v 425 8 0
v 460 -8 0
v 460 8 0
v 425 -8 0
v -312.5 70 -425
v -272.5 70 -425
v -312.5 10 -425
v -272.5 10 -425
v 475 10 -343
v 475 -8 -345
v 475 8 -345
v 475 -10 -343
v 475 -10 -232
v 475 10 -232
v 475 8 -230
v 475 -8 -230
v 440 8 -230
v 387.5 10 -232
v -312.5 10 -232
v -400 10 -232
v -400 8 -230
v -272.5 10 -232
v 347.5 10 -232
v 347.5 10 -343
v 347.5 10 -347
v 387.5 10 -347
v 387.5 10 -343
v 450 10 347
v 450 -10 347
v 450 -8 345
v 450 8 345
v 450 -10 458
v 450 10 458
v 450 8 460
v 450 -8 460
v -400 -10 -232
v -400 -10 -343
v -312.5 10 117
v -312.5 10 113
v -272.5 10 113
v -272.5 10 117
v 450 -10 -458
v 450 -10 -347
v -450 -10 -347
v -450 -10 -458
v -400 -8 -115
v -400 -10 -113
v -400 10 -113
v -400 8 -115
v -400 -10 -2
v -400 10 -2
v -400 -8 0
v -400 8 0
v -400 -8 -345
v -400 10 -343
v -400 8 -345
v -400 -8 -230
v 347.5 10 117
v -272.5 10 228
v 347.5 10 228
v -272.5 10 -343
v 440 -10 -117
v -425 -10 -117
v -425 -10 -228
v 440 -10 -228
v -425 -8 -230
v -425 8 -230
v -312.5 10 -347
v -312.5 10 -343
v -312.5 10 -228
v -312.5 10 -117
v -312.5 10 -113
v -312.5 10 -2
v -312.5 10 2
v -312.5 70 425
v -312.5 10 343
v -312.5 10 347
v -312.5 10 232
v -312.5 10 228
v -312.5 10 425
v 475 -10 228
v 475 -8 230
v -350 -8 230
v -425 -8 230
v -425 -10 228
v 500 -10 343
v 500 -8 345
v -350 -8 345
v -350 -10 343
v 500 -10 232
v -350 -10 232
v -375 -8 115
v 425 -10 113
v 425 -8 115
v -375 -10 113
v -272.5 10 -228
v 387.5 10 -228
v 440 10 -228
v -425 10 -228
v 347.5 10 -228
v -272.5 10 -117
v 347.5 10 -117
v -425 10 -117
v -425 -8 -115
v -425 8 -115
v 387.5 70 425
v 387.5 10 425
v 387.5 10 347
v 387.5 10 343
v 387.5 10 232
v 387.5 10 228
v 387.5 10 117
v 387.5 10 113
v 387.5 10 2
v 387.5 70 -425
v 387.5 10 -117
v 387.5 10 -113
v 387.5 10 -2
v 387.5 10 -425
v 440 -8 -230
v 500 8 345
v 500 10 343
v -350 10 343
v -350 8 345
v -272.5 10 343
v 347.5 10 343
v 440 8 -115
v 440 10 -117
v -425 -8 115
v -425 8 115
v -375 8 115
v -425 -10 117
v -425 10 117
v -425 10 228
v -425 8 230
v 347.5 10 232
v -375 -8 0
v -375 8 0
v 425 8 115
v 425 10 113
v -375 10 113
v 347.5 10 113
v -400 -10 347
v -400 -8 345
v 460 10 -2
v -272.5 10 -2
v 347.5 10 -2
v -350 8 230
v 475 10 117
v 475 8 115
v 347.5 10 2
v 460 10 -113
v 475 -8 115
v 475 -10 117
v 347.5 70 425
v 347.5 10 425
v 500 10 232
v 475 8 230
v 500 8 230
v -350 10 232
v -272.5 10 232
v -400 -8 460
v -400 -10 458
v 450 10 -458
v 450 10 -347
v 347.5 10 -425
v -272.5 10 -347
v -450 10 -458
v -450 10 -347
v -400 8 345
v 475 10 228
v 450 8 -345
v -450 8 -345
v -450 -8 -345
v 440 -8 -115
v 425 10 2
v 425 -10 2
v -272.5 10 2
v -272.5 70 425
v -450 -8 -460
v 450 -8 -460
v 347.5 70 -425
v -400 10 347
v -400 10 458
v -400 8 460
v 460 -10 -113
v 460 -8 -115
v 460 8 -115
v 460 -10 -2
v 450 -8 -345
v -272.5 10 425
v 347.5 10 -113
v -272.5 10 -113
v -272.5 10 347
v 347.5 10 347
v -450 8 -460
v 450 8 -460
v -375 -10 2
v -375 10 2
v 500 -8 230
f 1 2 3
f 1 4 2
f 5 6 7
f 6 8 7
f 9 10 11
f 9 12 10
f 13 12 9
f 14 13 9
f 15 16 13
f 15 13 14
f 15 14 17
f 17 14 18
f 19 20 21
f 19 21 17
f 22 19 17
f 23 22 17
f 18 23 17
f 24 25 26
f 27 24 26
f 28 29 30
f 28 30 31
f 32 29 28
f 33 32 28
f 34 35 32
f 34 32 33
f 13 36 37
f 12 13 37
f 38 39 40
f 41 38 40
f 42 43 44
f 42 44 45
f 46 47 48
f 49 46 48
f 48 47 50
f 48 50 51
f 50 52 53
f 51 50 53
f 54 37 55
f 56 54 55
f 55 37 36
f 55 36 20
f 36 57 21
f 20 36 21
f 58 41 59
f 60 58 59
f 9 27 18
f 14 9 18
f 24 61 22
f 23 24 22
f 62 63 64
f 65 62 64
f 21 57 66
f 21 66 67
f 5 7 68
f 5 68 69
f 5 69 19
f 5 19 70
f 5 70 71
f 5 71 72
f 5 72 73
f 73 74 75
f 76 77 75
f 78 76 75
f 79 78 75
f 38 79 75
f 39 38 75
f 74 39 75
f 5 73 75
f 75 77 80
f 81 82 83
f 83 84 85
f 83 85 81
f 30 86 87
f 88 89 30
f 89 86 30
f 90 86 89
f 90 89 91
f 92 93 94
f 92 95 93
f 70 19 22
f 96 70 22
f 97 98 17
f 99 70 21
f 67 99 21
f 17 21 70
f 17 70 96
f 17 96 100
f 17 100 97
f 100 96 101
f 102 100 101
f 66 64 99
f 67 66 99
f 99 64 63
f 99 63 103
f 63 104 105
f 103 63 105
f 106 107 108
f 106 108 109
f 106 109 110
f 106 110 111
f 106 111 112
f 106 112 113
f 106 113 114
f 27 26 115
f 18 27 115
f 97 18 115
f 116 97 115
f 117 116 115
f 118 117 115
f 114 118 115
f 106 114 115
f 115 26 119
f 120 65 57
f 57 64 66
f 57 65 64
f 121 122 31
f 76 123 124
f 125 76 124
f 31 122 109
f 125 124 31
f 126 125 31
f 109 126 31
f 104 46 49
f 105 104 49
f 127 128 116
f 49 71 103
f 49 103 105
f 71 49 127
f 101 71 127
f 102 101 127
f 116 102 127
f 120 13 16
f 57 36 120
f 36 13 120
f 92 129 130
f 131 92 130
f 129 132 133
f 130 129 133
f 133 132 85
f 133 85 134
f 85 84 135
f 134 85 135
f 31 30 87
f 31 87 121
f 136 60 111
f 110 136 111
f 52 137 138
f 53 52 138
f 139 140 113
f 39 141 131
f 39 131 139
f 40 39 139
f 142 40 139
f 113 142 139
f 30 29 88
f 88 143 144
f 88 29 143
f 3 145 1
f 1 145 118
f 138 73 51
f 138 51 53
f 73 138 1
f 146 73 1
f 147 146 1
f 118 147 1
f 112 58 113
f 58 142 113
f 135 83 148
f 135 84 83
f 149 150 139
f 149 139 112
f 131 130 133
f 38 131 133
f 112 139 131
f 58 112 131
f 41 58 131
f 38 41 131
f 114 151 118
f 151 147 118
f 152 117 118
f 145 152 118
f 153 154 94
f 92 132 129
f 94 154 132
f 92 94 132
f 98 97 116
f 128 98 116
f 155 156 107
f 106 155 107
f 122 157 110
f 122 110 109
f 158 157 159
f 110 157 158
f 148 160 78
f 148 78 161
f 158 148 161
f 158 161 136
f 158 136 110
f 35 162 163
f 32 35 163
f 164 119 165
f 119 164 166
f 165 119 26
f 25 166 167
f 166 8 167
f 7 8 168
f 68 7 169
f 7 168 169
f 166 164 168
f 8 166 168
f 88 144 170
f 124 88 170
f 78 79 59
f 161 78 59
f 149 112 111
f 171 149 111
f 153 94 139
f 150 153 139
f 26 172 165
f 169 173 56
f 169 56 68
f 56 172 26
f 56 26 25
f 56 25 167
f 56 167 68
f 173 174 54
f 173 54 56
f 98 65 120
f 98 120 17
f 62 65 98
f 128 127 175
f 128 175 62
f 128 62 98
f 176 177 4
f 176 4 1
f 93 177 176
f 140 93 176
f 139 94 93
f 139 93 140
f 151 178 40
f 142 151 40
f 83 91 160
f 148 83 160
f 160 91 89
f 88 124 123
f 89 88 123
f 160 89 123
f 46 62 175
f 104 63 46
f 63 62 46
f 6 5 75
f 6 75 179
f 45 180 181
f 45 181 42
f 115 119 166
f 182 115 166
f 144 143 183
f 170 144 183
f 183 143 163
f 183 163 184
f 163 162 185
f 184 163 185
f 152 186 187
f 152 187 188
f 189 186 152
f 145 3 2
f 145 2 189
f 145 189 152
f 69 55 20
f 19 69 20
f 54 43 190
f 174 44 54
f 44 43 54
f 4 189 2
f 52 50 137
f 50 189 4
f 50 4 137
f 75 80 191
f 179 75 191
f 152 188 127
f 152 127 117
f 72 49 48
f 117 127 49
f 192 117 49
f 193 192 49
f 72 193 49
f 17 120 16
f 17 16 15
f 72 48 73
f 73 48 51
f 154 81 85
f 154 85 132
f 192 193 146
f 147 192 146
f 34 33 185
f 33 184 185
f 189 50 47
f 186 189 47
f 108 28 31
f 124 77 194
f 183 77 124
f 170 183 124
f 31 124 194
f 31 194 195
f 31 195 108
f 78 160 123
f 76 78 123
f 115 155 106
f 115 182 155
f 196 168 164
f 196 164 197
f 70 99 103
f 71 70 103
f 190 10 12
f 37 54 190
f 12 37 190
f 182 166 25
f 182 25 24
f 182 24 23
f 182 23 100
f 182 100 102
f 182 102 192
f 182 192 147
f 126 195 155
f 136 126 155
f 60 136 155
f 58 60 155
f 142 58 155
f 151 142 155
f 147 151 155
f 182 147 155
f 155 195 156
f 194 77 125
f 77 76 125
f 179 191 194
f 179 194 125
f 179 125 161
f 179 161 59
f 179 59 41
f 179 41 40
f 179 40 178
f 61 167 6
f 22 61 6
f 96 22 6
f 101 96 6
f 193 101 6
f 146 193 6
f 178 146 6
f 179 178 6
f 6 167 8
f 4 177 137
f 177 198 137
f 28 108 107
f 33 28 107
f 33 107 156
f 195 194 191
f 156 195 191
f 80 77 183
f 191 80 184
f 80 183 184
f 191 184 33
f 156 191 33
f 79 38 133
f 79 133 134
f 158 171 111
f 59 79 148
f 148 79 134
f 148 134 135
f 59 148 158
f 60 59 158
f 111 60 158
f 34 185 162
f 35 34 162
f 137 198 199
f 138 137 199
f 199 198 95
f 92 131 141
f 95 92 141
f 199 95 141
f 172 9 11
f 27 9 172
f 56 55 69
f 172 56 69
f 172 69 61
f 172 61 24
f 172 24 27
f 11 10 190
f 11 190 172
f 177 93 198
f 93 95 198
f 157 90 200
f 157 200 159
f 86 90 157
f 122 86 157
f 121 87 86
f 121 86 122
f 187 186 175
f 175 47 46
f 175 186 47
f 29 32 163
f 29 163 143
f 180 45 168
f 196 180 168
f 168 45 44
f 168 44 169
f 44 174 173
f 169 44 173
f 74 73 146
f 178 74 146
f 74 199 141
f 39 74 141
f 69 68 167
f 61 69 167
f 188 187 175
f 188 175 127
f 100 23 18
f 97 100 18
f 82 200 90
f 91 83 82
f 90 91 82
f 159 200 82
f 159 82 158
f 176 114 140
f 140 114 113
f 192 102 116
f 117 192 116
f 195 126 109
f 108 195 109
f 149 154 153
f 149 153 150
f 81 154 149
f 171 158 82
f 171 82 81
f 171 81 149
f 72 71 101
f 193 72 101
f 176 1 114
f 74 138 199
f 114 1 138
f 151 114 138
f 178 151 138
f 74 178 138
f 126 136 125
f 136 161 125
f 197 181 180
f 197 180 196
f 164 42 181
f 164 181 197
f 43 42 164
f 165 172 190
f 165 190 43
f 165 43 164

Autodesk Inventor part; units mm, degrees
ref_plane "YZ Plane" through (0, 0, 0) normal (1, 0, 0) x (0, 1, 0)
ref_plane "XZ Plane" through (0, 0, 0) normal (0, 1, 0) x (-1, 0, 0)
ref_plane "XY Plane" through (0, 0, 0) normal (0, 0, 1) x (1, 0, 0)
sketch "Skizze1" plane through (0, 0, 0) normal (1, 0, 0) x (0, 1, 0)
  line L0 (8, 460) -> (-8, 460)
  line L1 (-10, 458) -> (-10, 347)
  line L2 (-8, 345) -> (8, 345)
  line L3 (10, 347) -> (10, 458)
  line L4 (8, 345) -> (-8, 345)
  line L5 (-10, 343) -> (-10, 232)
  line L6 (-8, 230) -> (8, 230)
  line L7 (10, 232) -> (10, 343)
  line L8 (8, 230) -> (-8, 230)
  line L9 (-10, 228) -> (-10, 117)
  line L10 (-8, 115) -> (8, 115)
  line L11 (10, 117) -> (10, 228)
  line L12 (8, 115) -> (-8, 115)
  line L13 (-10, 113) -> (-10, 2)
  line L14 (-8, 0) -> (8, 0)
  line L15 (10, 2) -> (10, 113)
  line L16 (8, 0) -> (-8, 0)
  line L17 (-10, -2) -> (-10, -113)
  line L18 (-8, -115) -> (8, -115)
  line L19 (10, -113) -> (10, -2)
  line L20 (8, -115) -> (-8, -115)
  line L21 (-10, -117) -> (-10, -228)
  line L22 (-8, -230) -> (8, -230)
  line L23 (10, -228) -> (10, -117)
  line L24 (8, -230) -> (-8, -230)
  line L25 (-10, -232) -> (-10, -343)
  line L26 (-8, -345) -> (8, -345)
  line L27 (10, -343) -> (10, -232)
  line L28 (10, -343) -> (8, -345)
  line L29 (10, -232) -> (8, -230)
  line L30 (10, -228) -> (8, -230)
  line L31 (10, -117) -> (8, -115)
  line L32 (8, -115) -> (10, -113)
  line L33 (10, -2) -> (8, 0)
  line L34 (8, 0) -> (10, 2)
  line L35 (10, 113) -> (8, 115)
  line L36 (8, 115) -> (10, 117)
  line L37 (10, 228) -> (8, 230)
  line L38 (10, 232) -> (8, 230)
  line L39 (10, 343) -> (8, 345)
  line L40 (10, 347) -> (8, 345)
  line L41 (10, 458) -> (8, 460)
  line L42 (-8, -345) -> (-10, -343)
  line L43 (-10, -232) -> (-8, -230)
  line L44 (-10, -228) -> (-8, -230)
  line L45 (-10, -117) -> (-8, -115)
  line L46 (-10, -113) -> (-8, -115)
  line L47 (-10, -2) -> (-8, 0)
  line L48 (-10, 2) -> (-8, 0)
  line L49 (-10, 113) -> (-8, 115)
  line L50 (-10, 117) -> (-8, 115)
  line L51 (-10, 343) -> (-8, 345)
  line L52 (-10, 347) -> (-8, 345)
  line L53 (-8, 460) -> (-10, 458)
  line L54 (8, -345) -> (-8, -345)
  line L55 (-10, -347) -> (-10, -458)
  line L56 (-8, -460) -> (8, -460)
  line L57 (10, -458) -> (10, -347)
  line L58 (8, -345) -> (10, -347)
  line L59 (10, -458) -> (8, -460)
  line L60 (-8, -460) -> (-10, -458)
  line L61 (-10, -347) -> (-8, -345)
  line L62 (-8, 230) -> (-10, 232)
  line L63 (-8, 230) -> (-10, 228)
  point P0 (0, 115)
  point P1 (10, 460)
  point P2 (-10, 345)
  point P3 (-10, 460)
  point P4 (10, 345)
  point P5 (-10, 230)
  point P6 (-10, 345)
  point P7 (10, 230)
  point P8 (-10, 115)
  point P9 (-10, 230)
  point P10 (10, 115)
  point P11 (-10, 0)
  point P12 (-10, 115)
  point P13 (10, 0)
  point P14 (-10, -115)
  point P15 (-10, 0)
  point P16 (10, -115)
  point P17 (-10, -230)
  point P18 (-10, -115)
  point P19 (10, -230)
  point P20 (0, 115)
  point P21 (-10, 230)
  point P22 (-10, 230)
  point P23 (-9, 0)
  point P24 (-9, -115)
  point P25 (-9, -230)
  point P26 (-10, -345)
  point P27 (10, -345)
  point P28 (-10, 0)
  point P29 (-10, 0)
  point P30 (-10, 0)
  point P31 (-10, 115)
  point P32 (-10, 115)
  point P33 (-10, 345)
  point P34 (-10, 345)
  point P35 (-8, -115)
  point P36 (-10, -460)
  point P37 (-10, -345)
  point P38 (10, -460)
  point P39 (0, 0)
  point P40 (0, 0)
  dimension "d0" = 20
  dimension "d1" = 115
  dimension "d30" = 2
  dimension "d31" = 2
  dimension "d32" = 2
  dimension "d33" = 2
  dimension "d34" = 2
  dimension "d35" = 2
  dimension "d36" = 2
  dimension "d37" = 2
  dimension "d38" = 2
  dimension "d39" = 2
  dimension "d40" = 2
  dimension "d41" = 2
  dimension "d42" = 2
  dimension "d43" = 2
  dimension "d44" = 2
  dimension "d45" = 2
  dimension "d46" = 2
  dimension "d47" = 2
  dimension "d48" = 2
  dimension "d49" = 2
  dimension "d50" = 2
  dimension "d51" = 2
  dimension "d52" = 2
  dimension "d53" = 2
  dimension "d54" = 2
  dimension "d55" = 2
  dimension "d56" = 2
  dimension "d57" = 2
  dimension "d58" = 2
  dimension "d59" = 2
  dimension "d60" = 2
  dimension "d61" = 2
  dimension "d62" = 2
  dimension "d63" = 2
  dimension "d64" = 2
  dimension "d65" = 2
  dimension "d66" = 2
  dimension "d67" = 2
  dimension "d68" = 2
  dimension "d69" = 2
  dimension "d70" = 2
  dimension "d71" = 2
  dimension "d72" = 2
  dimension "d73" = 2
  dimension "d74" = 2
  dimension "d75" = 2
  dimension "d76" = 2
  dimension "d77" = 2
  dimension "d78" = 2
  dimension "d79" = 2
  dimension "d80" = 2
  dimension "d81" = 2
  dimension "d90" = 2
  dimension "d91" = 2
  dimension "d92" = 2
  dimension "d93" = 2
  dimension "d94" = 2
  dimension "d95" = 2
  dimension "d96" = 2
  dimension "d97" = 2
  dimension "d102" = 2
  dimension "d103" = 2
extrude "Extrusion1" add sketch "Skizze1" along normal blind 450 and the other way blind 400 contours L41 L3 L40 L2 L52 L1 L53 L0
extrude "Extrusion3" add sketch "Skizze1" along normal blind 475 and the other way blind 425 contours L37 L11 L36 L10 L50 L9 L63 L6
extrude "Extrusion2" add sketch "Skizze1" along normal blind 500 and the other way blind 350 contours L39 L7 L38 L6 L62 L5 L51 L2
extrude "Extrusion4" add sketch "Skizze1" along normal blind 425 and the other way blind 375 contours L35 L15 L34 L14 L48 L13 L49 L10
extrude "Extrusion5" add sketch "Skizze1" along normal blind 460 and the other way blind 400 contours L33 L19 L32 L18 L46 L17 L47 L14
extrude "Extrusion6" add sketch "Skizze1" along normal blind 440 and the other way blind 425 contours L31 L23 L30 L22 L44 L21 L45 L18
extrude "Extrusion7" add sketch "Skizze1" along normal blind 475 and the other way blind 400 contours L29 L27 L28 L26 L42 L25 L43 L22
extrude "Extrusion9" add sketch "Skizze1" along normal blind 450 and the other way blind 450 contours L58 L57 L59 L56 L60 L55 L61 L26
sketch "Skizze2" plane through (-400, 10, 458) normal (0, 1, 0) x (1, 0, 0)
  line L0 (747.5, 33) -> (787.5, 33)
  line L1 (787.5, 33) -> (787.5, 883)
  line L2 (787.5, 883) -> (747.5, 883)
  line L3 (747.5, 883) -> (747.5, 33)
  line L4 (87.5, 33) -> (127.5, 33)
  line L5 (127.5, 33) -> (127.5, 883)
  line L6 (127.5, 883) -> (87.5, 883)
  line L7 (87.5, 883) -> (87.5, 33)
  line L8 (87.5, 33) -> (787.5, 33) construction
  line L9 (787.5, 33) -> (787.5, 883) construction
  line L10 (787.5, 883) -> (87.5, 883) construction
  line L11 (87.5, 883) -> (87.5, 33) construction
  line L12 (-25, -2) -> (900, -2) construction
  line L13 (900, -2) -> (900, 918) construction
  line L14 (900, 918) -> (-25, 918) construction
  line L15 (-25, 918) -> (-25, -2) construction
  line L16 (0, -2) -> (850, -2) construction
  line L17 (-25, 230) -> (-25, 341) construction
  line L18 (900, 226) -> (900, 115) construction
  line L19 (0, 803) -> (875, 803) construction
  line L20 (-25, 458) -> (900, 458) construction
  line L21 (0, 803) -> (875, 803) construction
  line L22 (437.5, -2) -> (437.5, 918) construction
  line L23 (-50, 918) -> (850, 918) projected
  point P0 (400, 458)
  point P1 (87.5, 458)
  point P2 (437.5, 33)
  dimension "d82" = 40
  dimension "d83" = 40
  dimension "d84" = 850
  dimension "d85" = 700
extrude "Extrusion8" add sketch "Skizze2" along normal blind 60
equation "\"d31\" = d30"
equation "\"d33\" = d32"
equation "\"d34\" = d32"
equation "\"d35\" = d34"
equation "\"d36\" = d32"
equation "\"d37\" = d36"
equation "\"d38\" = d32"
equation "\"d39\" = d38"
equation "\"d40\" = d32"
equation "\"d41\" = d40"
equation "\"d42\" = d32"
equation "\"d43\" = d42"
equation "\"d44\" = d32"
equation "\"d45\" = d44"
equation "\"d46\" = d32"
equation "\"d47\" = d46"
equation "\"d48\" = d32"
equation "\"d49\" = d48"
equation "\"d50\" = d32"
equation "\"d51\" = d50"
equation "\"d52\" = d32"
equation "\"d53\" = d52"
equation "\"d54\" = d32"
equation "\"d55\" = d54"
equation "\"d56\" = d32"
equation "\"d57\" = d56"
equation "\"d59\" = d58"
equation "\"d60\" = d58"
equation "\"d61\" = d60"
equation "\"d62\" = d58"
equation "\"d63\" = d62"
equation "\"d64\" = d58"
equation "\"d65\" = d64"
equation "\"d66\" = d58"
equation "\"d67\" = d66"
equation "\"d68\" = d58"
equation "\"d69\" = d68"
equation "\"d70\" = d58"
equation "\"d71\" = d70"
equation "\"d72\" = d58"
equation "\"d73\" = d72"
equation "\"d74\" = d58"
equation "\"d75\" = d74"
equation "\"d76\" = d58"
equation "\"d77\" = d76"
equation "\"d78\" = d58"
equation "\"d79\" = d78"
equation "\"d80\" = d58"
equation "\"d81\" = d80"
equation "\"d91\" = d90"
equation "\"d92\" = d90"
equation "\"d93\" = d92"
equation "\"d94\" = d90"
equation "\"d95\" = d94"
equation "\"d96\" = d90"
equation "\"d97\" = d96"
equation "\"d83\" = d82"
properties part number "Backboard" material "Holz (Birke)"
